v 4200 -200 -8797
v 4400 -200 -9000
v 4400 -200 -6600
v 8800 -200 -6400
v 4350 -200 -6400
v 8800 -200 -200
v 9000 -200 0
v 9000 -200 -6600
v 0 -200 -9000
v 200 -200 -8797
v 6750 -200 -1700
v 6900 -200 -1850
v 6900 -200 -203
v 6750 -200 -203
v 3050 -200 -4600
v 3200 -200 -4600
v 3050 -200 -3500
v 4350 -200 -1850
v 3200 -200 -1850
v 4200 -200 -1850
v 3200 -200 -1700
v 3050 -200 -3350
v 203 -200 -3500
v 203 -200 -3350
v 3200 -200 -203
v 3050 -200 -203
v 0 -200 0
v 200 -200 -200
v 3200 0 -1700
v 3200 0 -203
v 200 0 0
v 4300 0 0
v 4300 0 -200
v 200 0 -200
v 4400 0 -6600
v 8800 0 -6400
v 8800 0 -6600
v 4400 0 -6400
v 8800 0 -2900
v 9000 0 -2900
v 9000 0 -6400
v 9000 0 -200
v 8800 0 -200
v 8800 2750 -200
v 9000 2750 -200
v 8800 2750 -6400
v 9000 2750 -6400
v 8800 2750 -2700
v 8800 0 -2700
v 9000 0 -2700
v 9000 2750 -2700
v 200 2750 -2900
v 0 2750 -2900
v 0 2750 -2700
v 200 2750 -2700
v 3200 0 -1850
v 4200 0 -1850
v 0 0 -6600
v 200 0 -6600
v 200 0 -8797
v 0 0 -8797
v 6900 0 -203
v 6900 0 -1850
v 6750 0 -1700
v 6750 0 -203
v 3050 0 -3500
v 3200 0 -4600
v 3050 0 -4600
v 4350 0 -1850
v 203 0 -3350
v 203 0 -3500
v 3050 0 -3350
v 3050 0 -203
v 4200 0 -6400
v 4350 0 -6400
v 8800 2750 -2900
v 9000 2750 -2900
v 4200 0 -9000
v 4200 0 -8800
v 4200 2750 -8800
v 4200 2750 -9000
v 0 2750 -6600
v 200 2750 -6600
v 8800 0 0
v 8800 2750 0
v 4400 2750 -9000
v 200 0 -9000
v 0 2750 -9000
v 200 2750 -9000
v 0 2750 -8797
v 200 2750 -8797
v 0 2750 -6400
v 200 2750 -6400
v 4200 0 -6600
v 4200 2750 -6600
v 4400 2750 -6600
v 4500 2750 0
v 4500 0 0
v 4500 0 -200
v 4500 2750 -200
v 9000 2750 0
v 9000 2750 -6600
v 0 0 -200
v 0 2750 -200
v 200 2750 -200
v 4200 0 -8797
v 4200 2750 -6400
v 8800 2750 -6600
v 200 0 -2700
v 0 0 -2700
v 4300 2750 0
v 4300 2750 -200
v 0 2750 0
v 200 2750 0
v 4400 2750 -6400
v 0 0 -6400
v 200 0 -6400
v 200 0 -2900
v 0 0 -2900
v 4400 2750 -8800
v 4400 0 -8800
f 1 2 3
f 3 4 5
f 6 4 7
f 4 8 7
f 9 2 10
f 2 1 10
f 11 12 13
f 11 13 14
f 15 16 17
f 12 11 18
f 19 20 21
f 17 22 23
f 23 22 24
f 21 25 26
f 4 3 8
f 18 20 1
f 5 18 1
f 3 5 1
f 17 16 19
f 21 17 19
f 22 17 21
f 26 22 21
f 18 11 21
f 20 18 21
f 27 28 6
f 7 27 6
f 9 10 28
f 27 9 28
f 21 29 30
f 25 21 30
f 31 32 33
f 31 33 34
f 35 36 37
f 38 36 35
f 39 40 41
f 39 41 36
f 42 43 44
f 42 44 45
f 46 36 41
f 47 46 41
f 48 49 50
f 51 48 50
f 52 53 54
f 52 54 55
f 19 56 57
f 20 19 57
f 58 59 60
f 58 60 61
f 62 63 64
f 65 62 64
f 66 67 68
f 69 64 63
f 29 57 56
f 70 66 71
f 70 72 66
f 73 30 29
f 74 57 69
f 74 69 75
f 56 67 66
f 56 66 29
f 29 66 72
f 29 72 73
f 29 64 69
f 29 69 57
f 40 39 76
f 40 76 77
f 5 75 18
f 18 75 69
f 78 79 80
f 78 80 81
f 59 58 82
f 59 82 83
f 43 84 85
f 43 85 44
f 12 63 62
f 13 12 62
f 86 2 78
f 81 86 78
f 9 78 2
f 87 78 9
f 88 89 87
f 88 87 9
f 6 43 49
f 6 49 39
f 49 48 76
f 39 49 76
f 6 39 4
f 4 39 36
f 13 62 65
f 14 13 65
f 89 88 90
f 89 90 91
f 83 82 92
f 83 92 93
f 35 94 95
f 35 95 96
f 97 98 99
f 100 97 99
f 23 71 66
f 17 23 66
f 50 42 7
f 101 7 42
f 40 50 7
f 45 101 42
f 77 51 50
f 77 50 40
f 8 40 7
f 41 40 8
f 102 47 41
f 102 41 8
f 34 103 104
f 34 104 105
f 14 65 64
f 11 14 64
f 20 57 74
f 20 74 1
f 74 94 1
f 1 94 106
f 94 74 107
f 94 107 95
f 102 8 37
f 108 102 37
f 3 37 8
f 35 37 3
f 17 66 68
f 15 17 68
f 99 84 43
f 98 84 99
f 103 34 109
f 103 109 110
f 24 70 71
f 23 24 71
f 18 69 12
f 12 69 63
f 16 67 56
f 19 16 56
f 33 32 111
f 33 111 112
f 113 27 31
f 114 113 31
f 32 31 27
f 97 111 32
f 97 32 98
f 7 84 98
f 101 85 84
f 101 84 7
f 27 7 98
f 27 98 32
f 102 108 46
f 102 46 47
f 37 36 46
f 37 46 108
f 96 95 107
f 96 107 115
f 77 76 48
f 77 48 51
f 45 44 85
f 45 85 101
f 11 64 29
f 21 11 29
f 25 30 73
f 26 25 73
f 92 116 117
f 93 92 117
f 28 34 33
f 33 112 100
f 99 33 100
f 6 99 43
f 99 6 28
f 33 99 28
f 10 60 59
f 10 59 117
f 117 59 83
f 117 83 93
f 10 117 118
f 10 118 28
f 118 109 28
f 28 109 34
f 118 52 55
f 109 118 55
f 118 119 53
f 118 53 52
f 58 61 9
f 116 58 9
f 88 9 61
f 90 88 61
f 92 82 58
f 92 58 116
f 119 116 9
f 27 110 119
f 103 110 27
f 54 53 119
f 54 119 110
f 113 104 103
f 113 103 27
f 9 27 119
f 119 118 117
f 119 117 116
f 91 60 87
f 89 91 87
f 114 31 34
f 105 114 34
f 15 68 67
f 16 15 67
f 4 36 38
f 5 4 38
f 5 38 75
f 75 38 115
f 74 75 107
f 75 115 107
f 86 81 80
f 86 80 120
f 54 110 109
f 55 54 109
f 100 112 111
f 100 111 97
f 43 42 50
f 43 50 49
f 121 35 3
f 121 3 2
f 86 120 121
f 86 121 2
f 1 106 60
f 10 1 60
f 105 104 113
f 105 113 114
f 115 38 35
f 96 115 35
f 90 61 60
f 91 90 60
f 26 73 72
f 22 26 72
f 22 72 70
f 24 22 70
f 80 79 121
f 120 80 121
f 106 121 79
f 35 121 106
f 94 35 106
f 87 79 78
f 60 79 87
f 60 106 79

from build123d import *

# Parameters (mm, degrees)
EXTRUDE_1_DEPTH = 200
SKETCH_2_W      = 200
SKETCH_2_H      = 203
SKETCH_2_H_2    = 200
EXTRUDE_2_DEPTH = 2950


with BuildPart() as part:
    # Эскиз1 → Бобышка-Вытянуть1 (new body)
    with BuildSketch(Plane(origin=(0, 0, 0), x_dir=(-1, 0, 0), z_dir=(0, 1, 0))):
        Polygon((0, 0), (-9000, 0), (-9000, -6600), (-4400, -6600), (-4400, -9000), (0, -9000), align=None)
        Polygon((-200, -200), (-8800, -200), (-8800, -6400), (-4350, -6400), (-4350, -1850), (-6900, -1850), (-6900, -203), (-6750, -203), (-6750, -1700), (-3200, -1700), (-3200, -203), (-3050, -203), (-3050, -3350), (-203, -3350), (-203, -3500), (-3050, -3500), (-3050, -4600), (-3200, -4600), (-3200, -1850), (-4200, -1850), (-4200, -8797), (-200, -8797), align=None, mode=Mode.SUBTRACT)
    extrude(amount=-EXTRUDE_1_DEPTH)

    # Эскиз2 → Бобышка-Вытянуть2 (add)
    with BuildSketch(Plane(origin=(0, -200, 0), x_dir=(1, 0, 0), z_dir=(0, 1, 0))):
        with Locations((100, 8898.5)):
            Rectangle(SKETCH_2_W, SKETCH_2_H)
        with Locations((8900, 2800)):
            Rectangle(SKETCH_2_W, SKETCH_2_H_2)
        with Locations((4300, 8900)):
            Rectangle(SKETCH_2_W, SKETCH_2_H_2)
        with Locations((4300, 6500)):
            Rectangle(SKETCH_2_W, SKETCH_2_H_2)
        with Locations((4400, 100)):
            Rectangle(SKETCH_2_W, SKETCH_2_H_2)
        with Locations((8900, 6500)):
            Rectangle(SKETCH_2_W, SKETCH_2_H_2)
        with Locations((8900, 100)):
            Rectangle(SKETCH_2_W, SKETCH_2_H_2)
        with Locations((100, 100)):
            Rectangle(SKETCH_2_W, SKETCH_2_H_2)
        with Locations((100, 2800)):
            Rectangle(SKETCH_2_W, SKETCH_2_H_2)
        with Locations((100, 6500)):
            Rectangle(SKETCH_2_W, SKETCH_2_H_2)
    extrude(amount=EXTRUDE_2_DEPTH)


solid = part.part
